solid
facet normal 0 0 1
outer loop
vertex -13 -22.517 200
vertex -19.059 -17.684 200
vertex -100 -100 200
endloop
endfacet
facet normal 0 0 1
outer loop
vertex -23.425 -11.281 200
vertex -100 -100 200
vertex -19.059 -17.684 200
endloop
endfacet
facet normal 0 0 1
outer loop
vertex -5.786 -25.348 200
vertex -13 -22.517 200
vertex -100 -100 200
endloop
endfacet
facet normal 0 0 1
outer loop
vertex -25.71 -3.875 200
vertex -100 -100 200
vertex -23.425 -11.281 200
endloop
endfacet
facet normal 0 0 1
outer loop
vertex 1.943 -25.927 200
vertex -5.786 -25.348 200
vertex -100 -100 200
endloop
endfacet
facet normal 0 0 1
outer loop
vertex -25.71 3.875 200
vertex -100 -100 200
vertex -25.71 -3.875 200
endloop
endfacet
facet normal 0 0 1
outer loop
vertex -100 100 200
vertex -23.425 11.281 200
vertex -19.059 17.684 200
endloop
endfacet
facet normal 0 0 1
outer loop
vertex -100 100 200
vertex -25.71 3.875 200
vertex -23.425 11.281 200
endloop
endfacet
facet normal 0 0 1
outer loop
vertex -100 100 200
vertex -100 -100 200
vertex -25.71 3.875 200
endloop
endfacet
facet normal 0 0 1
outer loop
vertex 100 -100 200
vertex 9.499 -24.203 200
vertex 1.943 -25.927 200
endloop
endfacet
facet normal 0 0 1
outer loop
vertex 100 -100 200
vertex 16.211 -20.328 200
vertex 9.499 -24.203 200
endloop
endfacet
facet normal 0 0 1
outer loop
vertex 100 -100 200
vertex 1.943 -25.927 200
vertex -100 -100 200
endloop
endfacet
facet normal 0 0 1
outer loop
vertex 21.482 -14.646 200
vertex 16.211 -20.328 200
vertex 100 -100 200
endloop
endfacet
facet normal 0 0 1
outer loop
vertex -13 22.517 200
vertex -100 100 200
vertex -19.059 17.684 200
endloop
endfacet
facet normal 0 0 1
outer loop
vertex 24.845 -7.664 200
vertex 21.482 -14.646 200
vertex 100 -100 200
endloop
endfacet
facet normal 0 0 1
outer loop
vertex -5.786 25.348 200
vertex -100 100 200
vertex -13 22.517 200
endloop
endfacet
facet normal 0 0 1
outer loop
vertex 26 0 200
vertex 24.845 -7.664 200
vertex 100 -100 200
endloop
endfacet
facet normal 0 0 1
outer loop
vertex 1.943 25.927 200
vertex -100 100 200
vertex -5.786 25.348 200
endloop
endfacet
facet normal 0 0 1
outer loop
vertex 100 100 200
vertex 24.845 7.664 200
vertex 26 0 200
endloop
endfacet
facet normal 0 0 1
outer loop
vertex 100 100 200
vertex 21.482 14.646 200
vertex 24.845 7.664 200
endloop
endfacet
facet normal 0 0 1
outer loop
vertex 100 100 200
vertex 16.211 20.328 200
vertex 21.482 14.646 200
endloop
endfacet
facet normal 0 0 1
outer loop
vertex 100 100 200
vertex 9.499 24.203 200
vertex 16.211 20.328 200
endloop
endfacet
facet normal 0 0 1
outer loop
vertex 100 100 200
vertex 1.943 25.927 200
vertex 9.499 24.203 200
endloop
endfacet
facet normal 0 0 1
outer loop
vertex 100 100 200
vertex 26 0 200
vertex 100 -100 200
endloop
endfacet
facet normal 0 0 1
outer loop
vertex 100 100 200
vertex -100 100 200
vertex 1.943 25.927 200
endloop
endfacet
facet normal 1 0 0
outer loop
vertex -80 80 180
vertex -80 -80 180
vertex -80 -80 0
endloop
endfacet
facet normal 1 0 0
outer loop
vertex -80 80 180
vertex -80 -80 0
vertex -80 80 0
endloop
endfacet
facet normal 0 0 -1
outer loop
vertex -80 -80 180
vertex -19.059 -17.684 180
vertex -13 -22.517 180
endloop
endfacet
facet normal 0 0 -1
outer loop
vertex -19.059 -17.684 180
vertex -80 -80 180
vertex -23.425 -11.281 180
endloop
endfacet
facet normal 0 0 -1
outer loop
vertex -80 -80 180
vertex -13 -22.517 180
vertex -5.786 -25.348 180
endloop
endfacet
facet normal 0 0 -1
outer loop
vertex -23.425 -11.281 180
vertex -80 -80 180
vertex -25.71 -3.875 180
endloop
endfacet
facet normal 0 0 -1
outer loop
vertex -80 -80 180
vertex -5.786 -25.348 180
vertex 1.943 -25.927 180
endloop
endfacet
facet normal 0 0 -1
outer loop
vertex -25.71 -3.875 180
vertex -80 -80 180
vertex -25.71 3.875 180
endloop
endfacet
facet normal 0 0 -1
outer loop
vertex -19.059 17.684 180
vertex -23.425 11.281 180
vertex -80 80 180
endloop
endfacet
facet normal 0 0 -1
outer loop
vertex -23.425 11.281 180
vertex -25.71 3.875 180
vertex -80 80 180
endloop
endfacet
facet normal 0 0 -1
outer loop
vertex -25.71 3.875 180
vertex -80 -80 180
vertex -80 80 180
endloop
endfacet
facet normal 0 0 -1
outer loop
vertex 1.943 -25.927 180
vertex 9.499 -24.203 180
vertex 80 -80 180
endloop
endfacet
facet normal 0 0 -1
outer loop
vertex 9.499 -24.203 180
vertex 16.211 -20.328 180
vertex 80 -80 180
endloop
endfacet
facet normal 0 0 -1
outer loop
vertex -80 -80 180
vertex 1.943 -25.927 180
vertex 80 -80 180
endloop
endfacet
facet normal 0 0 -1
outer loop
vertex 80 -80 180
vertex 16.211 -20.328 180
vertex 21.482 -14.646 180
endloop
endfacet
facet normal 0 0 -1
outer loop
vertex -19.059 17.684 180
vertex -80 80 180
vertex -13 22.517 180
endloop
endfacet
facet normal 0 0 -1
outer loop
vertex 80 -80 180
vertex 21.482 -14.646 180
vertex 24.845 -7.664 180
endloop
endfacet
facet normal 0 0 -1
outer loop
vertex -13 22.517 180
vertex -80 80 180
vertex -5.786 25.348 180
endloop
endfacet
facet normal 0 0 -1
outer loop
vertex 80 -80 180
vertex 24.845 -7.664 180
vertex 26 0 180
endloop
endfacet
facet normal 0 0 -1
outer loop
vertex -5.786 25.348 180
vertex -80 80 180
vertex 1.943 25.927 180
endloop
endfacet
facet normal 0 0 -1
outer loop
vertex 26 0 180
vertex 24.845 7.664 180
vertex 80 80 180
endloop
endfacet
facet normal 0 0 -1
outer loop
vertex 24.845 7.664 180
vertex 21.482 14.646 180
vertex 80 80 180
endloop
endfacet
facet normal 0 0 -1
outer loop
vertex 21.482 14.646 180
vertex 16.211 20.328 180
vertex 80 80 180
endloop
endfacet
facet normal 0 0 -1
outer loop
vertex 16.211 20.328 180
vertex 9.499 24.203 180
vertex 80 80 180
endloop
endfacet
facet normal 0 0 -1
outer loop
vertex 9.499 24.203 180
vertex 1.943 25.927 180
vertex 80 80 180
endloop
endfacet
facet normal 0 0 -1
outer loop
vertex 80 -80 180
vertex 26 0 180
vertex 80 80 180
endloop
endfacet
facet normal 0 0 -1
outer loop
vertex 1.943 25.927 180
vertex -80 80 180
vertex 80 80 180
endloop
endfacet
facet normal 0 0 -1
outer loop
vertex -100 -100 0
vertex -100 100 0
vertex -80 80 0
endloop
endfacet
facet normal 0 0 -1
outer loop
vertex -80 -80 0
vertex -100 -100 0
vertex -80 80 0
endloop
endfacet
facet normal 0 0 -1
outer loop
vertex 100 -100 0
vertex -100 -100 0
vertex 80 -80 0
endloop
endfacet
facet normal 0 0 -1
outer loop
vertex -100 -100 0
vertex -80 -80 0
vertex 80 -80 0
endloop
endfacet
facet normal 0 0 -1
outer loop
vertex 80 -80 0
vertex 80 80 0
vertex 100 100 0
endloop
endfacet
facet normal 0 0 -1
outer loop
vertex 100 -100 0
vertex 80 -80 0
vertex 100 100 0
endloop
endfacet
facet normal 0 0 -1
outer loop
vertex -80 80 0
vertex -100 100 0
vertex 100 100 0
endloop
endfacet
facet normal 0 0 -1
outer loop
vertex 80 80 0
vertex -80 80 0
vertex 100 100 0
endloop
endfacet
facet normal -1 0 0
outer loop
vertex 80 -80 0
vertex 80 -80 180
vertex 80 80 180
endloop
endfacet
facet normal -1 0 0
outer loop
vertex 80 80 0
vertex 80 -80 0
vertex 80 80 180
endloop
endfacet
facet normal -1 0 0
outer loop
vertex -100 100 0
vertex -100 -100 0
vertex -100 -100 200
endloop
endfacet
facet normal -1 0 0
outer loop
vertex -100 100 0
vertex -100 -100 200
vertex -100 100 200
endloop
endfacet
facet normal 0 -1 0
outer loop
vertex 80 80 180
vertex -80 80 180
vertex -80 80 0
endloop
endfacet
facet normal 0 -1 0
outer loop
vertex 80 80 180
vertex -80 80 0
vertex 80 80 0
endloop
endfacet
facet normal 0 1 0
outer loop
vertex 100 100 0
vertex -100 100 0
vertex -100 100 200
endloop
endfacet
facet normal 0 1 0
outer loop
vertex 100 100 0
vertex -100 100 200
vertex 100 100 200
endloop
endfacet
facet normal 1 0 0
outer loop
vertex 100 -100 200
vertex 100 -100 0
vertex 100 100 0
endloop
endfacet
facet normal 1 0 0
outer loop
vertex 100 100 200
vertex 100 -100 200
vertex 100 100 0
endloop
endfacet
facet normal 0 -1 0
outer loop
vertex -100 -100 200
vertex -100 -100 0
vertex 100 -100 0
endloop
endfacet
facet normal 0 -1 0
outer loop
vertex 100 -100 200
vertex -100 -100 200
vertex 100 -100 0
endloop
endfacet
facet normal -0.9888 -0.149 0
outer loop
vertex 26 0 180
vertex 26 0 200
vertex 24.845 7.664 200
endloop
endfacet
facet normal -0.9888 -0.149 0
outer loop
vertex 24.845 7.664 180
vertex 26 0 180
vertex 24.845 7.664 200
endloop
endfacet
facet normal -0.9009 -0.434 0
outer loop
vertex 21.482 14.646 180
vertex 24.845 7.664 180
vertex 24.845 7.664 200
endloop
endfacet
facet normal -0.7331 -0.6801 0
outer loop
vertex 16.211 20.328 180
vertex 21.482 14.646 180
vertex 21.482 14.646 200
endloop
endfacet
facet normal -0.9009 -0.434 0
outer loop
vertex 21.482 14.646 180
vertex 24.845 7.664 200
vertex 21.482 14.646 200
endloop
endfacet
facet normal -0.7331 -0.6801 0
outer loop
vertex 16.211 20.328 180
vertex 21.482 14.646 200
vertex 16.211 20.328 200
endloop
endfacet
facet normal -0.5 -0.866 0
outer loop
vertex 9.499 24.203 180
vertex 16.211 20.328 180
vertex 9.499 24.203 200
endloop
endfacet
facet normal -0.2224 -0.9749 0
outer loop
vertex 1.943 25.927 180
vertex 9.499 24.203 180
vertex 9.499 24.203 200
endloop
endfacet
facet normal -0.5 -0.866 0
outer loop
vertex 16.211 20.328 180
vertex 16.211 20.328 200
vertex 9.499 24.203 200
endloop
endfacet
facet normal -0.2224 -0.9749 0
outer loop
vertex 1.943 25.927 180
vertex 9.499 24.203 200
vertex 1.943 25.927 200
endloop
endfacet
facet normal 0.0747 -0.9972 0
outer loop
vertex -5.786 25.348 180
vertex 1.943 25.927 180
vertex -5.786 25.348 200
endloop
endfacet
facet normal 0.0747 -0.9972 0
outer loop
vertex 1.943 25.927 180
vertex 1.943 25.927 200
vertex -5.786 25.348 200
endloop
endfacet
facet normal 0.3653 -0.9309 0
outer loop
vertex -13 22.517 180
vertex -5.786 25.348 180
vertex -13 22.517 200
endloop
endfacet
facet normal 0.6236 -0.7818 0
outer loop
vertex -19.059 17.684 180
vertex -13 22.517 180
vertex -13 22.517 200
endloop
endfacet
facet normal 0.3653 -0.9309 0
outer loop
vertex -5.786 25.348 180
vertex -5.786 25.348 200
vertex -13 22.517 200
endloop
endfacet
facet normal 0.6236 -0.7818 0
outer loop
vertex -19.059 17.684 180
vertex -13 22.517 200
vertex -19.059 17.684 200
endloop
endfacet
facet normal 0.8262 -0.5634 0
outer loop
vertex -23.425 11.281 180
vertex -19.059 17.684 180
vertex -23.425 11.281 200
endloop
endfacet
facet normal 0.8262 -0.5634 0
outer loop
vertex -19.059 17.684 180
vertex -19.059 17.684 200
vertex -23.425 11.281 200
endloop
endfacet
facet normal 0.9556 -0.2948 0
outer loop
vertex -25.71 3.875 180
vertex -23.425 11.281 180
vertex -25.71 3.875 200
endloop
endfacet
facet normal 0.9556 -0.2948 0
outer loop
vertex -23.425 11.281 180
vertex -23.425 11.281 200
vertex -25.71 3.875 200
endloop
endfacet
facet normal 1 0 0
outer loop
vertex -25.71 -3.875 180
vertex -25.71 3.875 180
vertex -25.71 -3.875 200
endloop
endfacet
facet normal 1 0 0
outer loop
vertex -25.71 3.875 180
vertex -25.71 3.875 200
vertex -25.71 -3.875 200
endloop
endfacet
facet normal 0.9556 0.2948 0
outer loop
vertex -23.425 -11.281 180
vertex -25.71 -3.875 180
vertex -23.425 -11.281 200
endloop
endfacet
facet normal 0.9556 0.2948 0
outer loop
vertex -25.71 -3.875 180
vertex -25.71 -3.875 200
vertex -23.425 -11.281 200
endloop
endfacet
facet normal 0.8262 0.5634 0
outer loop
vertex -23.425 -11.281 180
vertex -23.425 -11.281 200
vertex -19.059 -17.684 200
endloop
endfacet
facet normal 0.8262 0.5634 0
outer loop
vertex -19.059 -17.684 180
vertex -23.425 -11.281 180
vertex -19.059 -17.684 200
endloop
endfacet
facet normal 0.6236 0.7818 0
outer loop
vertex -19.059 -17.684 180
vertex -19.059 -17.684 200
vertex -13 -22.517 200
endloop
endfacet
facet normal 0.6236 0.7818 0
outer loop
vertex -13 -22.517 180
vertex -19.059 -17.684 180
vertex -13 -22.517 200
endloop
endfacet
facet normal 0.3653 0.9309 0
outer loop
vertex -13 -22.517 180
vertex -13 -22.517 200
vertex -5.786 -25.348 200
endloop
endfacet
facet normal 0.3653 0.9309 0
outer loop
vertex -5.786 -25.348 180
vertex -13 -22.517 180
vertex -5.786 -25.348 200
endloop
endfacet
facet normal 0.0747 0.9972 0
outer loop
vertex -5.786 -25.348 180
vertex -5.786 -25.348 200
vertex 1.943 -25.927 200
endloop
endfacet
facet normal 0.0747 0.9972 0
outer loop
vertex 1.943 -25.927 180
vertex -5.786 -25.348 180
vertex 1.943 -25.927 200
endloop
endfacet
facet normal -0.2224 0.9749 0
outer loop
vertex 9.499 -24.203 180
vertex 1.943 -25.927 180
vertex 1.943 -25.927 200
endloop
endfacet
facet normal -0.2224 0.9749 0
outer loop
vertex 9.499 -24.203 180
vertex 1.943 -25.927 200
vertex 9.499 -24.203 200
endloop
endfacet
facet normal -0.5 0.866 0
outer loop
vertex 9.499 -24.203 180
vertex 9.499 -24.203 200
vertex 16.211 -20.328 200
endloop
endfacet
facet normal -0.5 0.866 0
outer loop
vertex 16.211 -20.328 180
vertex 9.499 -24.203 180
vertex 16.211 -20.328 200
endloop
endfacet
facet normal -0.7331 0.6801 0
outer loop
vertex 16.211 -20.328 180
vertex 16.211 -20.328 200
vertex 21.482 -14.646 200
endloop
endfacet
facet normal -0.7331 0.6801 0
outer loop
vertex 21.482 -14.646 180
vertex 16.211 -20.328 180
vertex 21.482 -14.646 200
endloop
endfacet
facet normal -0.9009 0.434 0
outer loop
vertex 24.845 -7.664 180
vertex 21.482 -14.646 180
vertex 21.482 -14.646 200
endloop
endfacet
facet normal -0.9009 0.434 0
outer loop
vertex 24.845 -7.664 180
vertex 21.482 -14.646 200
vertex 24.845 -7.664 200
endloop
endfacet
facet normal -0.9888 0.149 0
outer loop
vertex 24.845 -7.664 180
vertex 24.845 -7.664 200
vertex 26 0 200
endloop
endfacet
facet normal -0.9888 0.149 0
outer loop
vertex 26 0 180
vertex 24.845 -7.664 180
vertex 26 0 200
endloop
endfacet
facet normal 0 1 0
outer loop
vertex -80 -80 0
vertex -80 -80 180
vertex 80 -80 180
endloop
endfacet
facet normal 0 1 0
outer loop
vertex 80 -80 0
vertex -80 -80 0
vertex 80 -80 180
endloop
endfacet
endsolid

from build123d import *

# Parameters (mm, degrees)
SKETCH5_W           = 200
SKETCH5_H           = 200
BOSS_EXTRUDE2_DEPTH = 200
SHELL2_T            = -20
SKETCH6_R           = 26
CUT_EXTRUDE2_DEPTH  = 51.6


with BuildPart() as part:
    # Sketch5 → Boss-Extrude2 (new body)
    with BuildSketch(Plane.XY):
        Rectangle(SKETCH5_W, SKETCH5_H)
    extrude(amount=BOSS_EXTRUDE2_DEPTH)

    # Shell2
    shell2_openings = [part.faces().sort_by_distance(p)[0] for p in [
        (0, 0, 0),
    ]]
    offset(amount=SHELL2_T, openings=shell2_openings, kind=Kind.INTERSECTION)

    # Sketch6 → Cut-Extrude2 (cut)
    with BuildSketch(Plane.XY.offset(200)):
        Circle(SKETCH6_R)
    extrude(amount=-CUT_EXTRUDE2_DEPTH, mode=Mode.SUBTRACT)


solid = part.part
